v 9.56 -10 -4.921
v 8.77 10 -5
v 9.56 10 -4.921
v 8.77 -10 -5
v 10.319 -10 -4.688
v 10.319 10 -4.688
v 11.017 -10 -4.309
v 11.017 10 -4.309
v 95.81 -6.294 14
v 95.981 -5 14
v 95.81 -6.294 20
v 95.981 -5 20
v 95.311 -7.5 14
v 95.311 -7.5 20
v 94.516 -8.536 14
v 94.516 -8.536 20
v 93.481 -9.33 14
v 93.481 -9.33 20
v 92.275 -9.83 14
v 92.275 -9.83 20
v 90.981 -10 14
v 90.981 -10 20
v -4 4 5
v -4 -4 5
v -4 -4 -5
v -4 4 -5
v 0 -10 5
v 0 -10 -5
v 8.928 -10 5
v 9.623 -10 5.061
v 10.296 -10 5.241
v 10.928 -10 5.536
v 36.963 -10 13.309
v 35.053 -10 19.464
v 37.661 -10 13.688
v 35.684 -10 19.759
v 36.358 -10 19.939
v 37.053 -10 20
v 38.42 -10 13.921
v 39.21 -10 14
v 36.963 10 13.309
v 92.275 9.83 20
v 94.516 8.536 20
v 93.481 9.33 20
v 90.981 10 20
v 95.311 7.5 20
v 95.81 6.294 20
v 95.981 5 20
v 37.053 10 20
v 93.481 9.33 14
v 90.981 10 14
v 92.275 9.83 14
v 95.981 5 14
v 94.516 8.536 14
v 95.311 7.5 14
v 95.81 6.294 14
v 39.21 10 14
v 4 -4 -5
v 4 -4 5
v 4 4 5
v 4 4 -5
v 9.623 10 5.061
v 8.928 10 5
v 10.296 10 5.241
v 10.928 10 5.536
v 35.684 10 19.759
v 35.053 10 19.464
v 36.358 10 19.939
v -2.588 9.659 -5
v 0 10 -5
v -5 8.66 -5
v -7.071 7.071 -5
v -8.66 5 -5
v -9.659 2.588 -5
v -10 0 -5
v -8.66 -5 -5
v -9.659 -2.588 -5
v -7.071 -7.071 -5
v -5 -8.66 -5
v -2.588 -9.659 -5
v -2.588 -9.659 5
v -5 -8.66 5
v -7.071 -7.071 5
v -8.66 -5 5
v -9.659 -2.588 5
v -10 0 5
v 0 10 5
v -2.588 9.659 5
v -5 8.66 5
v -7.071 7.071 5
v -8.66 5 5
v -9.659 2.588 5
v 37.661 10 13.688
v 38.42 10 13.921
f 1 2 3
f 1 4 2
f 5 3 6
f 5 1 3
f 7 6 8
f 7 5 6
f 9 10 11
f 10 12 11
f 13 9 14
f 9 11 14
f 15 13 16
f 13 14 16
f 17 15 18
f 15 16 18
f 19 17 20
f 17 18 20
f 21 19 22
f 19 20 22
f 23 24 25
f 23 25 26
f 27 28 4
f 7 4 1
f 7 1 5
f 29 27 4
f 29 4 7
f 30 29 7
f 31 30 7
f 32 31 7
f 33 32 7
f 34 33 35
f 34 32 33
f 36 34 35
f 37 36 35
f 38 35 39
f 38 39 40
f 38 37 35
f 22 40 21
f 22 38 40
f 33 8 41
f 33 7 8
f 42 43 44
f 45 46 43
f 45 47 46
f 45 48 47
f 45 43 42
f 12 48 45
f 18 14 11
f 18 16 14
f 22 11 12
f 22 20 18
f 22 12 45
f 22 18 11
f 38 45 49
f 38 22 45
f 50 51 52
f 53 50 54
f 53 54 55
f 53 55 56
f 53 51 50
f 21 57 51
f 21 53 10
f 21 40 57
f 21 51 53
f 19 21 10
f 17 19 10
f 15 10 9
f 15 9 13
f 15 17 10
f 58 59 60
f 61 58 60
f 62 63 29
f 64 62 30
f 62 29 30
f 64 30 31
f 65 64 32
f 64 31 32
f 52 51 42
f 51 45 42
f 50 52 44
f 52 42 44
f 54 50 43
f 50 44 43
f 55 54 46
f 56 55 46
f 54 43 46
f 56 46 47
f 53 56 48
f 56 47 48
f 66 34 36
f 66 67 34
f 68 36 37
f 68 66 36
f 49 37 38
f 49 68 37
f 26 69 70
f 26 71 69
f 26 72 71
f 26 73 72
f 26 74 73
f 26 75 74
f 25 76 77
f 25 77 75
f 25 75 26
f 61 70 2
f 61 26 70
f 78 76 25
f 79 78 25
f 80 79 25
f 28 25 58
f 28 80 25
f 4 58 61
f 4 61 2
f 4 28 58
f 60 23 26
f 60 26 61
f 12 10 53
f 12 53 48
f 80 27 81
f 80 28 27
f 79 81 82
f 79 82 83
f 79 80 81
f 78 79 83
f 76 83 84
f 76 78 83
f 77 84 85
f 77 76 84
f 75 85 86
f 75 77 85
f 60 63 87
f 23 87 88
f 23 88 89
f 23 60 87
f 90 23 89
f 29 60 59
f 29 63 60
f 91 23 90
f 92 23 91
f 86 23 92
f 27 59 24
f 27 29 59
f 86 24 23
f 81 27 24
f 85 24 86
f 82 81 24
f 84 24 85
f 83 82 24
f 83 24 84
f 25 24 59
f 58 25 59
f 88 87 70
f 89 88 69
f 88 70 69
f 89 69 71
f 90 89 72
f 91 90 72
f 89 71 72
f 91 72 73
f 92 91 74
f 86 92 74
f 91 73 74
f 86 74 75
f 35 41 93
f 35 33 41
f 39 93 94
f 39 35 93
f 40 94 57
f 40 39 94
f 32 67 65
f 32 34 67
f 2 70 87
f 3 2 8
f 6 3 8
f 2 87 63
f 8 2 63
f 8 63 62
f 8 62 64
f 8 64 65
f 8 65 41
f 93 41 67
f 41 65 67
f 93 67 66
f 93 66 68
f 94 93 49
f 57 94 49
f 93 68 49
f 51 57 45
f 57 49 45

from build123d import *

# Parameters (mm, degrees)
F1_DEPTH = 10
F2_W     = 8
F2_H     = 8
F3_DEPTH = 10
F4_R     = 9.99999
F5_R     = 4
F6_R     = 5


# Not quite as in the source:
# - a fillet or chamfer is up to 0.001 mm smaller than in the source, because OpenCascade refuses the exact size


with BuildPart() as f1:
    # F0 (on Front) → F1 (new body, symmetric)
    with BuildSketch(Plane.XZ):
        Polygon((35.9807621135, 20), (10, 5), (-10, 5), (-10, -5), (10, -5), (37.9807621135, 14), (95.9807621135, 14), (95.9807621135, 20), align=None)
    extrude(amount=F1_DEPTH, both=True)

    # F2 (on face) → F3 (cut, through all)
    with BuildSketch(Plane.XY.offset(5)):
        Rectangle(F2_W, F2_H)
    extrude(amount=-F3_DEPTH, mode=Mode.SUBTRACT)

    # F4 (radius 10 in the source; OpenCascade refuses exactly that, so slightly less here)
    f4_edges = [f1.edges().sort_by_distance(p)[0] for p in [
        (-10, -10, 0),
        (-10, 10, 0),
    ]]
    fillet(f4_edges, radius=F4_R)

    # F5
    f5_edges = [f1.edges().sort_by_distance(p)[0] for p in [
        (35.980762, 0, 20),
        (10, 0, 5),
        (10, 0, -5),
        (37.980762, 0, 14),
    ]]
    fillet(f5_edges, radius=F5_R)

    # F6
    f6_edges = [f1.edges().sort_by_distance(p)[0] for p in [
        (95.980762, 10, 17),
        (95.980762, -10, 17),
    ]]
    fillet(f6_edges, radius=F6_R)


solid = f1.part
